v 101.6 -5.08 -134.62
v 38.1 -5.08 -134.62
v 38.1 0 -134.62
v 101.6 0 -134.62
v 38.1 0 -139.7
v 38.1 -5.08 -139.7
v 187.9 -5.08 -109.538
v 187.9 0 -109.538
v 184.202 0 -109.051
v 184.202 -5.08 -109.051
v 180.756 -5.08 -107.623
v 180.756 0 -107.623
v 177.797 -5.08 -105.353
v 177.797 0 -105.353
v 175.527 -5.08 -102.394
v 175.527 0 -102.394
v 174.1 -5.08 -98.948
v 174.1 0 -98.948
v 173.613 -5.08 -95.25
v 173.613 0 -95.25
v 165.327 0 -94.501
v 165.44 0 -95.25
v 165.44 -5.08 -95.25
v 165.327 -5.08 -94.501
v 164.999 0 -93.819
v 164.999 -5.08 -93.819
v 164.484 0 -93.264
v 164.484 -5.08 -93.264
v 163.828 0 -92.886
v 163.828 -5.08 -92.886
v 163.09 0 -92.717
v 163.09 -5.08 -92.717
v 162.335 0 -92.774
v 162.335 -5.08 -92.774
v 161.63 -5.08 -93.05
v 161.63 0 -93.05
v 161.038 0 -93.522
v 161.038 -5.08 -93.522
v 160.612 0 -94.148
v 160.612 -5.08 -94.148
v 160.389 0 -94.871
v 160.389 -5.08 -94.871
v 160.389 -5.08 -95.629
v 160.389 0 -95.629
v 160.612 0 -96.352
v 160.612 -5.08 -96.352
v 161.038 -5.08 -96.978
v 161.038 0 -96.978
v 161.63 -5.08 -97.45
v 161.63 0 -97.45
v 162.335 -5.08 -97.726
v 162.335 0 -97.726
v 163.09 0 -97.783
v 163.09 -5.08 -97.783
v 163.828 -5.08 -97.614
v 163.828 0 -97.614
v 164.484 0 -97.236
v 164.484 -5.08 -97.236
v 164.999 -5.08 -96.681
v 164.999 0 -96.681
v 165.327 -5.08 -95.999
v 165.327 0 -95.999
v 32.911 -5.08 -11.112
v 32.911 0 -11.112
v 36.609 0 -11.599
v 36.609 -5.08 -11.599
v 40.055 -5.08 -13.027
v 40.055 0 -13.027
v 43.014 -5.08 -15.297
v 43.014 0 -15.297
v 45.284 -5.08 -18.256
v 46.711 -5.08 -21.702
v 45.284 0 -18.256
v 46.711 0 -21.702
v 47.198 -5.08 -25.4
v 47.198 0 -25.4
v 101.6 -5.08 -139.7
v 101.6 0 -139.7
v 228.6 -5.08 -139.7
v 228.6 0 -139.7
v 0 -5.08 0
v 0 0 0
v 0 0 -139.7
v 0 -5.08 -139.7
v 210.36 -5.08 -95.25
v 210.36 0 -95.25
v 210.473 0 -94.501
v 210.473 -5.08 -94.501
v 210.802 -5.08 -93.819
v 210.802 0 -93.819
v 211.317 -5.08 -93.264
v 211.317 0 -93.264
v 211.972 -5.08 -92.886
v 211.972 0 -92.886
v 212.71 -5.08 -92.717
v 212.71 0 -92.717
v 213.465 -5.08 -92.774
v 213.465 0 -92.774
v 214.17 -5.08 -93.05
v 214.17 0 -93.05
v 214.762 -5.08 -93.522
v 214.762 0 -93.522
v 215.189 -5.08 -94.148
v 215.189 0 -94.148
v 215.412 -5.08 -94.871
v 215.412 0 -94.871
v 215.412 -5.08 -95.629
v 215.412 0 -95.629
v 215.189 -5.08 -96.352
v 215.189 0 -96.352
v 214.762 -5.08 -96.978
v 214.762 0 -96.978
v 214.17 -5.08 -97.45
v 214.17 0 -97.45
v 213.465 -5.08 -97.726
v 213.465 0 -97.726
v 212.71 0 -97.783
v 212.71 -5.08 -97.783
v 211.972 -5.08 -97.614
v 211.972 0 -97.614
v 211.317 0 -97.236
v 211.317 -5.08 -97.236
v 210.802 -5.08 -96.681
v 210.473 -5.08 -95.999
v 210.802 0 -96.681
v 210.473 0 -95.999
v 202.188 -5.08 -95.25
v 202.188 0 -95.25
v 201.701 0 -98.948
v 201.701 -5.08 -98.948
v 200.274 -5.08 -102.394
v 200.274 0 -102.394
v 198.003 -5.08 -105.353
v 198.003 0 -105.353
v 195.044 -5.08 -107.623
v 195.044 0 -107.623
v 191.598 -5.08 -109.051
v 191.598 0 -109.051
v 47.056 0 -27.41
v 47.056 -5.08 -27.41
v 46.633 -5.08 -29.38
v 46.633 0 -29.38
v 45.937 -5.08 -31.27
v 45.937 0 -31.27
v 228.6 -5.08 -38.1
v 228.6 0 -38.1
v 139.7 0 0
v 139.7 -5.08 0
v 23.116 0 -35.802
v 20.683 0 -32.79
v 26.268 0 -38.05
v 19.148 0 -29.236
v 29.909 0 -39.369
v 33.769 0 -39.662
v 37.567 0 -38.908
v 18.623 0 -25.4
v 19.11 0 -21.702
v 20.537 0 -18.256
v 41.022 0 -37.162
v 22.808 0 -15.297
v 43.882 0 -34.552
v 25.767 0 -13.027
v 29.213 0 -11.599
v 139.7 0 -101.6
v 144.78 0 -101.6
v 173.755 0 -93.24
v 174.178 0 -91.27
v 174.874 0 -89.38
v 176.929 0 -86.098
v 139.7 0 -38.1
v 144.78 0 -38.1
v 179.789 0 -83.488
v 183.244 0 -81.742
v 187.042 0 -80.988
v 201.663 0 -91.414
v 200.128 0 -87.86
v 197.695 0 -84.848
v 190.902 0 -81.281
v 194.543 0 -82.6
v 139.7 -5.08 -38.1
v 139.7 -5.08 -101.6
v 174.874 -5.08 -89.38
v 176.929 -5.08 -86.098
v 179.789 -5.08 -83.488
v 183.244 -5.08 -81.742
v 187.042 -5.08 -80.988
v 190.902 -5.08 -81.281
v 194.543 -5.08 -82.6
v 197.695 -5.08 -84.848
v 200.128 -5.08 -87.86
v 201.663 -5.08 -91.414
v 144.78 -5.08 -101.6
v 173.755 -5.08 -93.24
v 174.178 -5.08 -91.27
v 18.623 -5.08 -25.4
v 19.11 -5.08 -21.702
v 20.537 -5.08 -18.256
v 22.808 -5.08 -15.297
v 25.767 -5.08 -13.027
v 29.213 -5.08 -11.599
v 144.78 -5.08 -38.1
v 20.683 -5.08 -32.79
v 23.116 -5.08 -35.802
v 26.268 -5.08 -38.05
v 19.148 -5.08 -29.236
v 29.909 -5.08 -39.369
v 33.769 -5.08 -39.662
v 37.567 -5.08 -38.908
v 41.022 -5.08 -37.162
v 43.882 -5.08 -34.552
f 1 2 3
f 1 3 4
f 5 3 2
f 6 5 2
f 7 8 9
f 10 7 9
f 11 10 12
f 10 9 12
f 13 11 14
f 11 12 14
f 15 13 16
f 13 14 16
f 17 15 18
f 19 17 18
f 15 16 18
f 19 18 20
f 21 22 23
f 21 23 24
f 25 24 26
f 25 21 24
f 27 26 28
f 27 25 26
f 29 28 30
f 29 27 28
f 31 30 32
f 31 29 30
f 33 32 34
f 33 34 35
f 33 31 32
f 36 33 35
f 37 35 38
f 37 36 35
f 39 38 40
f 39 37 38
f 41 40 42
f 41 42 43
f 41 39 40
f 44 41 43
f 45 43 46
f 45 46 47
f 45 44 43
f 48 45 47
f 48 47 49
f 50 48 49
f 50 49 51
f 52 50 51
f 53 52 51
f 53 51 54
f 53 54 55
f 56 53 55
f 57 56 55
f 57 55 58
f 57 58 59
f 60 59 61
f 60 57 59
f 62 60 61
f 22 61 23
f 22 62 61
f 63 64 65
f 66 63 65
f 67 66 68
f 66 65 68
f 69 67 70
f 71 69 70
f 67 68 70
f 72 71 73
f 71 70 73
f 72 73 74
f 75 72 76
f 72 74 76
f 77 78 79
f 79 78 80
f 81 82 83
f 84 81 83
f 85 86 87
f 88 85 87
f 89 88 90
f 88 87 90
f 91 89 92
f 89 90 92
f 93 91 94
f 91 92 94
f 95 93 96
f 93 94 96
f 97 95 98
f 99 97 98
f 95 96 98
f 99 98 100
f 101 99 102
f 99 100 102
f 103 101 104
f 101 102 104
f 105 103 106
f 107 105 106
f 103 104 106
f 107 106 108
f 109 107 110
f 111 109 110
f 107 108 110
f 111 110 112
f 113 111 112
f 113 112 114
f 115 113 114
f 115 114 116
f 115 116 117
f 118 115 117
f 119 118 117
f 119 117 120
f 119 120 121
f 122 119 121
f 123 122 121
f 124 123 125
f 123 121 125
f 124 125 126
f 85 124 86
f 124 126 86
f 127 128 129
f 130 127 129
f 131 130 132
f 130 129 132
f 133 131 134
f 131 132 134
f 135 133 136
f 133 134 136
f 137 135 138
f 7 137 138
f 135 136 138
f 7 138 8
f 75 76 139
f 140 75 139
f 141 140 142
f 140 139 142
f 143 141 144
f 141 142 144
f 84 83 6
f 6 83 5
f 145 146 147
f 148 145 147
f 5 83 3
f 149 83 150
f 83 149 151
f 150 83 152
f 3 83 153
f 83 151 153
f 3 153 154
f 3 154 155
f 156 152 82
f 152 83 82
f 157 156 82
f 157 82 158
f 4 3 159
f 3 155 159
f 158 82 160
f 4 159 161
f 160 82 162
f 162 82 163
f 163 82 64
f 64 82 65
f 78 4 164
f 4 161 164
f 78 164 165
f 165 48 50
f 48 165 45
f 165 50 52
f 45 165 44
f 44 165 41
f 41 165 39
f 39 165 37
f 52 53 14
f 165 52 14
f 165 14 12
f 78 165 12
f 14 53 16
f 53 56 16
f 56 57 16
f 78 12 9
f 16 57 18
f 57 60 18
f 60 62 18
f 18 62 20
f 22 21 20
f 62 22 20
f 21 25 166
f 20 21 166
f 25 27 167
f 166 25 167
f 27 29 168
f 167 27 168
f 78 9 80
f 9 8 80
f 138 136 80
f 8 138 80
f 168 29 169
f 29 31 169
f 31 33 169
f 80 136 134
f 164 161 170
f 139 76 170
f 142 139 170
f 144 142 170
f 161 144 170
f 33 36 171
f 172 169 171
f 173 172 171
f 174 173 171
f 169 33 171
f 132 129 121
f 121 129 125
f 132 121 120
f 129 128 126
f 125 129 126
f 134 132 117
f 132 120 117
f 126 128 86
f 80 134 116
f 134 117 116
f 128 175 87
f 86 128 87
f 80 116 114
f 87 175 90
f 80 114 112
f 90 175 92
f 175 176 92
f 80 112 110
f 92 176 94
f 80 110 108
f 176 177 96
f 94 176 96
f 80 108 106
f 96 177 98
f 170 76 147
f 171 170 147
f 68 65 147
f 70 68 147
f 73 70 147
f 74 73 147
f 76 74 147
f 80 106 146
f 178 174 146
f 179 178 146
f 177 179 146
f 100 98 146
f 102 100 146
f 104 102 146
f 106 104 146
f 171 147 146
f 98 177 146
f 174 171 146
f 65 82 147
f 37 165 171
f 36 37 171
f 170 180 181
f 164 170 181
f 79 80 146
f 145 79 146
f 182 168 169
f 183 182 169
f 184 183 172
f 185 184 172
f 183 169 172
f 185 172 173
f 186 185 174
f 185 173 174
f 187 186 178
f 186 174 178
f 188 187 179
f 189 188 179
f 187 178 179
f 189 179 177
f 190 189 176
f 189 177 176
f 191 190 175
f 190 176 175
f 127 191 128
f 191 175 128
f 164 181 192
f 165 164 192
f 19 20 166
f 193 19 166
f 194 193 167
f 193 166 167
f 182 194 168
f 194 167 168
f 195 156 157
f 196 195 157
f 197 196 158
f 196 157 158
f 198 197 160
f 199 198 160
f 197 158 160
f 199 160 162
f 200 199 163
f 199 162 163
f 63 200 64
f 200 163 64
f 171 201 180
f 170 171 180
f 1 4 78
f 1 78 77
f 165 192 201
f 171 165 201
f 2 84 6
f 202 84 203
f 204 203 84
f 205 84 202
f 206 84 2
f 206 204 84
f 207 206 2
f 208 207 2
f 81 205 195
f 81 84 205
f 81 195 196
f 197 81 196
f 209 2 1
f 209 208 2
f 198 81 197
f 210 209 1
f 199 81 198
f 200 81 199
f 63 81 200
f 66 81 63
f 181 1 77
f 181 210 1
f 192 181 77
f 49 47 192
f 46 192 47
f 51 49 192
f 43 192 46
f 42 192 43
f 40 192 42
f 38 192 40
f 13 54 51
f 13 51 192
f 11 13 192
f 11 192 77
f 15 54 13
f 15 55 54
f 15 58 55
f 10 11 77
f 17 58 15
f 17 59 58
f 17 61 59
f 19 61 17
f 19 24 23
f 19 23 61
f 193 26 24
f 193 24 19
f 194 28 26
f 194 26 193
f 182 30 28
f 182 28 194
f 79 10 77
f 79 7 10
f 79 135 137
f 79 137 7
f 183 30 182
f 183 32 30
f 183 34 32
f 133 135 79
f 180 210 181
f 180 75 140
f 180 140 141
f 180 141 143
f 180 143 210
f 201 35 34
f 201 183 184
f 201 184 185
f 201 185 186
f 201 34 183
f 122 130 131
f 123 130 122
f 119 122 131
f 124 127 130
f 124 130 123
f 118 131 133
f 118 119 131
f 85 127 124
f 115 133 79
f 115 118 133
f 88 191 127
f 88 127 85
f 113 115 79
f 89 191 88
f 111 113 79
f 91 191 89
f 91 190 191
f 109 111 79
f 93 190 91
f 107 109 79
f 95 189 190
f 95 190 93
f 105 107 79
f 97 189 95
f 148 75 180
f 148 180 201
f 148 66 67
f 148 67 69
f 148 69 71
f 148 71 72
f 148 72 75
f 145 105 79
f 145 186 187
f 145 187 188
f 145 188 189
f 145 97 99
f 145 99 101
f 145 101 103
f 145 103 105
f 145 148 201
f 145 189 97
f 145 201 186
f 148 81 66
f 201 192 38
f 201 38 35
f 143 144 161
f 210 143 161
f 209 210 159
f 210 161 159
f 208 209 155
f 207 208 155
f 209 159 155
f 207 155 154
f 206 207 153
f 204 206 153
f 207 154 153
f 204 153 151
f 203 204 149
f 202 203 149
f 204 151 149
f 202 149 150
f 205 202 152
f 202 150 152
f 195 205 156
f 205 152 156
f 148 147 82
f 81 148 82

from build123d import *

# Parameters (mm, degrees)
F0_R     = 2.54
F1_DEPTH = 5.08
F2_W     = 63.5
F2_H     = 5.08
F3_DEPTH = 5.08
F5_DEPTH = 25.4


with BuildPart() as f1:
    # F0 (on Front) → F1 (new body)
    with BuildSketch(Plane.XZ):
        with BuildLine():
            Line((32.91078, 0), (0, 0))
            Line((0, 0), (0, -25.4))
            Line((0, -25.4), (18.62328, -25.4))
            ThreePointArc((18.62328, -25.4), (22.807992, -15.297212), (32.91078, -11.1125))
            Line((32.91078, -11.1125), (32.91078, 0))
        make_face()
        with BuildLine():
            Line((18.62328, -25.4), (0, -25.4))
            Line((0, -25.4), (0, -139.7))
            Line((0, -139.7), (139.7, -139.7))
            Line((139.7, -139.7), (187.900217, -139.7))
            Line((187.900217, -139.7), (187.900217, -109.5375))
            ThreePointArc((187.900217, -109.5375), (177.797429, -105.352788), (173.612717, -95.25))
            ThreePointArc((173.612717, -95.25), (173.931707, -92.247768), (174.874435, -89.379594))
            Line((174.874435, -89.379594), (45.936562, -31.270406))
            ThreePointArc((45.936562, -31.270406), (29.908548, -39.368509), (18.62328, -25.4))
        make_face()
        with Locations((162.900217, -95.25)):
            Circle(F0_R, mode=Mode.SUBTRACT)
        with BuildLine():
            Line((139.7, 0), (32.91078, 0))
            Line((32.91078, 0), (32.91078, -11.1125))
            ThreePointArc((32.91078, -11.1125), (43.013568, -15.297212), (47.19828, -25.4))
            ThreePointArc((47.19828, -25.4), (46.879289, -28.402232), (45.936562, -31.270406))
            Line((45.936562, -31.270406), (174.874435, -89.379594))
            ThreePointArc((174.874435, -89.379594), (190.902449, -81.281491), (202.187717, -95.25))
            ThreePointArc((202.187717, -95.25), (198.003005, -105.352788), (187.900217, -109.5375))
            Line((187.900217, -109.5375), (187.900217, -139.7))
            Line((187.900217, -139.7), (228.6, -139.7))
            Line((228.6, -139.7), (228.6, -38.1))
            Line((228.6, -38.1), (139.7, 0))
        make_face()
        with BuildLine():
            ThreePointArc((215.440217, -95.25), (212.900217, -97.79), (210.360217, -95.25))
            ThreePointArc((210.360217, -95.25), (212.900217, -92.71), (215.440217, -95.25))
        make_face(mode=Mode.SUBTRACT)
    extrude(amount=F1_DEPTH)

    # F2 (on face) → F3 (cut)
    with BuildSketch(Plane(origin=(0, 0, -139.7), x_dir=(1, 0, 0), z_dir=(0, 0, -1))):
        with Locations((69.85, 2.54)):
            Rectangle(F2_W, F2_H)
    extrude(amount=-F3_DEPTH, mode=Mode.SUBTRACT)

    # F4 (on face) → F5 (cut)
    with BuildSketch(Plane.XZ.offset(5.08)):
        Polygon((139.7, -69.85), (139.7, -101.6), (142.24, -101.6), (144.78, -101.6), (144.78, -38.1), (139.7, -38.1), align=None)
    extrude(amount=-F5_DEPTH, mode=Mode.SUBTRACT)


solid = f1.part
